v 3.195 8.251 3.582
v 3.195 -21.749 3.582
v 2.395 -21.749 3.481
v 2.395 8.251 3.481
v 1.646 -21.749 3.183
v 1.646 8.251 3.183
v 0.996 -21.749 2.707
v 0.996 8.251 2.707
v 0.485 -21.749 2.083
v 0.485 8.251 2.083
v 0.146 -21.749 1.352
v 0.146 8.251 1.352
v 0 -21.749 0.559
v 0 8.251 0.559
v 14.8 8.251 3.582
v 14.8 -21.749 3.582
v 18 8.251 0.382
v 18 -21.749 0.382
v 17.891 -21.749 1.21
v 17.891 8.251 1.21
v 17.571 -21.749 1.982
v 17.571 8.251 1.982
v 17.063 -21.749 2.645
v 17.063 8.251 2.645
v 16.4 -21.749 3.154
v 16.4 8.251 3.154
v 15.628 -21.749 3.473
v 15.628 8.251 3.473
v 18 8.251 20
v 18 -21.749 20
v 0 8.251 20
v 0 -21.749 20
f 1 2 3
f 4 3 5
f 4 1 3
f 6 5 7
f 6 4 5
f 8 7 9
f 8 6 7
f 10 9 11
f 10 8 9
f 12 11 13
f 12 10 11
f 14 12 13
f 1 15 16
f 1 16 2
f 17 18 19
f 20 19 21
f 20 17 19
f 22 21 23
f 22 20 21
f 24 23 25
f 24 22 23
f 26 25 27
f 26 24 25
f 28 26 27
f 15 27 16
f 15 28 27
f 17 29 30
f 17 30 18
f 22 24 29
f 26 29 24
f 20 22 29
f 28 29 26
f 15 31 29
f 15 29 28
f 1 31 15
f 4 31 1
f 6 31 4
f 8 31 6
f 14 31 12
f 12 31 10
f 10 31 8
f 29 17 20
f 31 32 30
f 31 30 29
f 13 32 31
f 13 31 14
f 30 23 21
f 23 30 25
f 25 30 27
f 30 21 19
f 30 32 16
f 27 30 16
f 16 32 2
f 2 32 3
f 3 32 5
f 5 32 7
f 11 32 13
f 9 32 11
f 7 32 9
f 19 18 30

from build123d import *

# Parameters (mm, degrees)
SKETCH_1_W          = 20
SKETCH_1_H          = 30
EXTRUDE_1_DEPTH     = 18
CUT_EXTRUDE_4_DEPTH = 41.298883359


with BuildPart() as part:
    # Эскиз1 → Вытянуть1 (new body)
    with BuildSketch(Plane(origin=(0, 0, 0), x_dir=(0, 0, -1), z_dir=(1, 0, 0))):
        with Locations((-10, -6.749432462)):
            Rectangle(SKETCH_1_W, SKETCH_1_H)
    extrude(amount=EXTRUDE_1_DEPTH)

    # Эскиз2 → Вырез-Вытянуть4 (cut, through all)
    with BuildSketch(Plane(origin=(0, 8.250567538, 0), x_dir=(1, 0, 0), z_dir=(0, 1, 0))):
        with BuildLine():
            Line((-0.004897471, 0.146832679), (18, 0.146832679))
            Line((18, 0.146832679), (18, -0.382236535))
            ThreePointArc((18, -0.382236535), (17.0627417, -2.644978234), (14.8, -3.582236535))
            Line((14.8, -3.582236535), (3.195102529, -3.582236535))
            ThreePointArc((3.195102529, -3.582236535), (0.932360829, -2.644978234), (-0.004897471, -0.382236535))
            Line((-0.004897471, -0.382236535), (-0.004897471, 0.146832679))
        make_face()
    extrude(amount=-CUT_EXTRUDE_4_DEPTH, mode=Mode.SUBTRACT)


solid = part.part
